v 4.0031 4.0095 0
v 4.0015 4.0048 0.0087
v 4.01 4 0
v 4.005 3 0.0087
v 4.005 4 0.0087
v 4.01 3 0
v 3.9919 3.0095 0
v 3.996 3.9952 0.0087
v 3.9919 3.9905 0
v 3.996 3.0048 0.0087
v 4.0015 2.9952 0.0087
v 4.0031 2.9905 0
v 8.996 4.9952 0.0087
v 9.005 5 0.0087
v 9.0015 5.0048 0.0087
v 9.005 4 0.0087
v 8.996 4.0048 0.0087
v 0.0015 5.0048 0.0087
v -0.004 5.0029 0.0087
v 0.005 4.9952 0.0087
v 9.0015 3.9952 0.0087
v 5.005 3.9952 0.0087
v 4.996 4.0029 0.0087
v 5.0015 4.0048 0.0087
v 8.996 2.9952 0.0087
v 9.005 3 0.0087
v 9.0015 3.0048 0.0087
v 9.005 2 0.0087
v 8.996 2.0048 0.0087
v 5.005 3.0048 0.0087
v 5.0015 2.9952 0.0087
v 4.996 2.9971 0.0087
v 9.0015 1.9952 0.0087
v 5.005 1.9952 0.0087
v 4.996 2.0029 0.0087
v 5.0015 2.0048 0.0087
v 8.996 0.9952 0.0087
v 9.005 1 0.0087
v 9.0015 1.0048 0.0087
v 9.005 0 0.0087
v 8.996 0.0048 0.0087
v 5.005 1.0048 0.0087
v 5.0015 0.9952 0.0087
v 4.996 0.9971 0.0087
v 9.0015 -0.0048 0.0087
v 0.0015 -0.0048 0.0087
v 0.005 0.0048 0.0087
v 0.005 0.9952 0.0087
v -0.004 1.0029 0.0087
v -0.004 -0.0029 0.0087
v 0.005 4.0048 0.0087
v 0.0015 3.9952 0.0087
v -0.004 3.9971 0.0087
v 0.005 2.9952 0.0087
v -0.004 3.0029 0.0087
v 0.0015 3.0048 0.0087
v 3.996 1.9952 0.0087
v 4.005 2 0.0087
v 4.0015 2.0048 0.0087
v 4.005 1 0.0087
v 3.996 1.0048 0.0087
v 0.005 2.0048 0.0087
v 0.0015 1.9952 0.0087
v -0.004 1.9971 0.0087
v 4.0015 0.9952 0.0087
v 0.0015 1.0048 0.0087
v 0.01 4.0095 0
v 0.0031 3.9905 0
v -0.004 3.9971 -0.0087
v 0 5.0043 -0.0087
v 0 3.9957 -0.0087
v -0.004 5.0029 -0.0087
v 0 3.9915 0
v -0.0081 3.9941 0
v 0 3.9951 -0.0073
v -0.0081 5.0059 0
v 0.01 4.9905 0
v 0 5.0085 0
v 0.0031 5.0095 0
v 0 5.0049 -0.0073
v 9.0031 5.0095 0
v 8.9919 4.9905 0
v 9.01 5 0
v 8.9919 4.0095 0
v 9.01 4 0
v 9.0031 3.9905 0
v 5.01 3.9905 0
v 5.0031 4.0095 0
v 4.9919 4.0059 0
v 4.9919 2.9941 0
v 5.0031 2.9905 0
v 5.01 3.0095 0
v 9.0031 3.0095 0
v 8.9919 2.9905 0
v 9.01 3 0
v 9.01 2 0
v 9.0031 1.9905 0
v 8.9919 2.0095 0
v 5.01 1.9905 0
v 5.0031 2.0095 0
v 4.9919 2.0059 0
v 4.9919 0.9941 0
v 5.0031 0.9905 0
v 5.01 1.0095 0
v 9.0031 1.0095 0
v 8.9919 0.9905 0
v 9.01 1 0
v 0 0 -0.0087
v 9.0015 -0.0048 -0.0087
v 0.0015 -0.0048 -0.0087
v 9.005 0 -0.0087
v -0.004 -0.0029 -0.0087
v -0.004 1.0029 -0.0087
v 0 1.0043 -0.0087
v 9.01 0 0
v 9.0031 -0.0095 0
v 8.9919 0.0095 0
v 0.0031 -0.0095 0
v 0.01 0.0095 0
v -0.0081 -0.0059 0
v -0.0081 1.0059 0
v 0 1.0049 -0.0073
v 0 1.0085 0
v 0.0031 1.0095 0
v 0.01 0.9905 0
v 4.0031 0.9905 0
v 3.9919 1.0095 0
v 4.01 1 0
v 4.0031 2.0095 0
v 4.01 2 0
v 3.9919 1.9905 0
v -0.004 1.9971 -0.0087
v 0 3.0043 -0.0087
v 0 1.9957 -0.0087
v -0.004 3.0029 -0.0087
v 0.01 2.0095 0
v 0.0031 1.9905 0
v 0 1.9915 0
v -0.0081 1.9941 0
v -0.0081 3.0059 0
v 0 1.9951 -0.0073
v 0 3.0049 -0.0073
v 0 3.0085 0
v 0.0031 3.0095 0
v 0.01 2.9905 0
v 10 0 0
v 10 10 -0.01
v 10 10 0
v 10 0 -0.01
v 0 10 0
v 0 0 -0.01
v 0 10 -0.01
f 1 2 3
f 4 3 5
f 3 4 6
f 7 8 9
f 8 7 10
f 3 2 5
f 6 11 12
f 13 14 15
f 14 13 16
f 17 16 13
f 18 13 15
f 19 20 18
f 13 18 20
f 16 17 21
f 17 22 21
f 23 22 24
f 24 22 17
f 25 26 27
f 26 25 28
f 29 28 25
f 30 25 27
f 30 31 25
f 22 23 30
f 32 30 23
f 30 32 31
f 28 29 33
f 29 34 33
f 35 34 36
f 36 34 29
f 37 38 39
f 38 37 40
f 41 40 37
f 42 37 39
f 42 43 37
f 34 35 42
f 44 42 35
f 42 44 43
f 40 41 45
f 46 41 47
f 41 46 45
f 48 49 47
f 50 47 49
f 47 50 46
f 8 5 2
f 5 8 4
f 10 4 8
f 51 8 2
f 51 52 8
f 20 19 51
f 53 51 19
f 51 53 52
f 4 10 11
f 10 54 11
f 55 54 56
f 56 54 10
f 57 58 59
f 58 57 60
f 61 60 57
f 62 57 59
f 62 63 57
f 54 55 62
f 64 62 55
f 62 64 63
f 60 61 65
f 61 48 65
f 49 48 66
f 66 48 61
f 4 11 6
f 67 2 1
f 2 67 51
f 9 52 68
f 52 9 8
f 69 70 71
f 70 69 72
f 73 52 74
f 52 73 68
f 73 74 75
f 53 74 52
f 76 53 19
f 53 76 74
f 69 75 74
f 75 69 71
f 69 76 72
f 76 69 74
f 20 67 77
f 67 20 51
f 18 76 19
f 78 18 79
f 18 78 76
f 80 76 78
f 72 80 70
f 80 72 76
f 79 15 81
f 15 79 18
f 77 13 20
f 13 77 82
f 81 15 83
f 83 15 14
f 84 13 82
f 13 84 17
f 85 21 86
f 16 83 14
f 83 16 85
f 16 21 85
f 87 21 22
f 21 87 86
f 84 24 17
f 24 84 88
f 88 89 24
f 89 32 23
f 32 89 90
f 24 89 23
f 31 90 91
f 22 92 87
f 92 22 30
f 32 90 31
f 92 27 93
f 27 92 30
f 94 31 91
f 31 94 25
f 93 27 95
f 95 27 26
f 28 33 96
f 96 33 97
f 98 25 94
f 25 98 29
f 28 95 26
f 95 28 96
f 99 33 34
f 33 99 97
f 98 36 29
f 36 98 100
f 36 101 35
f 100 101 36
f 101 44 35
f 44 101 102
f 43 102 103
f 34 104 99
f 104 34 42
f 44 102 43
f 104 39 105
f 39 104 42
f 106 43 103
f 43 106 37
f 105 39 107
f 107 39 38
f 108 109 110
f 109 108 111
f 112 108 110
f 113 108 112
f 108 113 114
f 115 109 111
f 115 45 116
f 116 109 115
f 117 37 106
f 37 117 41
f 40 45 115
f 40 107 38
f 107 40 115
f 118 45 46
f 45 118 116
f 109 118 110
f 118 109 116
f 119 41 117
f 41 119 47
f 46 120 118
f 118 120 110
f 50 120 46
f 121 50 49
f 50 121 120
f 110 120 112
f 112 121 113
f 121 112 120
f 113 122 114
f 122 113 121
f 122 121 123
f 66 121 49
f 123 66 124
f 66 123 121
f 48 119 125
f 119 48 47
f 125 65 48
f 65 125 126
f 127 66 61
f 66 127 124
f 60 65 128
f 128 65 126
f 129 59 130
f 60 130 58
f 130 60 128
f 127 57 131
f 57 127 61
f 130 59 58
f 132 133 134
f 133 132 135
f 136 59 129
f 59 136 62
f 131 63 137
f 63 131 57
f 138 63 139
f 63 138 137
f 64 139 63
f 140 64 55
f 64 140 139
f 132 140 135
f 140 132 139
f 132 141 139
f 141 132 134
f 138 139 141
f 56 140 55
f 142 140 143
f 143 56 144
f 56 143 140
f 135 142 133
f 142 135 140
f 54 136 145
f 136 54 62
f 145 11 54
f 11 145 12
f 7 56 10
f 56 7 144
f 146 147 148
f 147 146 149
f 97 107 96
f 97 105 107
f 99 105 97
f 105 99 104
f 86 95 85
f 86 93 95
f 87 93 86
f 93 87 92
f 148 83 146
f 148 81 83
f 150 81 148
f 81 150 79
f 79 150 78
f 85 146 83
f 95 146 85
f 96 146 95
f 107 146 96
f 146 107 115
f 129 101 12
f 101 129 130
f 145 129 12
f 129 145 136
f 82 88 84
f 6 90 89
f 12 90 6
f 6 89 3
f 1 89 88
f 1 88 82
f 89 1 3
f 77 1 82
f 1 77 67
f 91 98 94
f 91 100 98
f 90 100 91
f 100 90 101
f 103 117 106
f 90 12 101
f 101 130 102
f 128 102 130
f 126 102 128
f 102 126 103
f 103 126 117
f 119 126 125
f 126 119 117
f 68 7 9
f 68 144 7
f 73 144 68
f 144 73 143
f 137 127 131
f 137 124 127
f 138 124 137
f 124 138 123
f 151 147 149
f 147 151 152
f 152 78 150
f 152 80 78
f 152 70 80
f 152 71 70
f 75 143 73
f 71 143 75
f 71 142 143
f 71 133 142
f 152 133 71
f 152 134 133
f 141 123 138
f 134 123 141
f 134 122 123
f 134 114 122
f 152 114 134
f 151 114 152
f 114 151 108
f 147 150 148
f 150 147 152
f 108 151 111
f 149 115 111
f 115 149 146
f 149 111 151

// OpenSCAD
hull(){
    translate([4, 3]) sphere(0.01);
    translate([4, 4]) sphere(0.01);
}
hull(){
    translate([4, 4]) sphere(0.01);
    translate([3, 4]) sphere(0.01);
}
hull(){
    translate([3, 4]) sphere(0.01);
    translate([2, 4]) sphere(0.01);
}
hull(){
    translate([2, 4]) sphere(0.01);
    translate([1, 4]) sphere(0.01);
}
hull(){
    translate([1, 4]) sphere(0.01);
    translate([0, 4]) sphere(0.01);
}
hull(){
    translate([0, 4]) sphere(0.01);
    translate([0, 5]) sphere(0.01);
}
hull(){
    translate([0, 5]) sphere(0.01);
    translate([1, 5]) sphere(0.01);
}
hull(){
    translate([1, 5]) sphere(0.01);
    translate([2, 5]) sphere(0.01);
}
hull(){
    translate([2, 5]) sphere(0.01);
    translate([3, 5]) sphere(0.01);
}
hull(){
    translate([3, 5]) sphere(0.01);
    translate([4, 5]) sphere(0.01);
}
hull(){
    translate([4, 5]) sphere(0.01);
    translate([5, 5]) sphere(0.01);
}
hull(){
    translate([5, 5]) sphere(0.01);
    translate([6, 5]) sphere(0.01);
}
hull(){
    translate([6, 5]) sphere(0.01);
    translate([7, 5]) sphere(0.01);
}
hull(){
    translate([7, 5]) sphere(0.01);
    translate([8, 5]) sphere(0.01);
}
hull(){
    translate([8, 5]) sphere(0.01);
    translate([9, 5]) sphere(0.01);
}
hull(){
    translate([9, 5]) sphere(0.01);
    translate([9, 4]) sphere(0.01);
}
hull(){
    translate([9, 4]) sphere(0.01);
    translate([8, 4]) sphere(0.01);
}
hull(){
    translate([8, 4]) sphere(0.01);
    translate([7, 4]) sphere(0.01);
}
hull(){
    translate([7, 4]) sphere(0.01);
    translate([6, 4]) sphere(0.01);
}
hull(){
    translate([6, 4]) sphere(0.01);
    translate([5, 4]) sphere(0.01);
}
hull(){
    translate([5, 4]) sphere(0.01);
    translate([5, 3]) sphere(0.01);
}
hull(){
    translate([5, 3]) sphere(0.01);
    translate([6, 3]) sphere(0.01);
}
hull(){
    translate([6, 3]) sphere(0.01);
    translate([7, 3]) sphere(0.01);
}
hull(){
    translate([7, 3]) sphere(0.01);
    translate([8, 3]) sphere(0.01);
}
hull(){
    translate([8, 3]) sphere(0.01);
    translate([9, 3]) sphere(0.01);
}
hull(){
    translate([9, 3]) sphere(0.01);
    translate([9, 2]) sphere(0.01);
}
hull(){
    translate([9, 2]) sphere(0.01);
    translate([8, 2]) sphere(0.01);
}
hull(){
    translate([8, 2]) sphere(0.01);
    translate([7, 2]) sphere(0.01);
}
hull(){
    translate([7, 2]) sphere(0.01);
    translate([6, 2]) sphere(0.01);
}
hull(){
    translate([6, 2]) sphere(0.01);
    translate([5, 2]) sphere(0.01);
}
hull(){
    translate([5, 2]) sphere(0.01);
    translate([5, 1]) sphere(0.01);
}
hull(){
    translate([5, 1]) sphere(0.01);
    translate([6, 1]) sphere(0.01);
}
hull(){
    translate([6, 1]) sphere(0.01);
    translate([7, 1]) sphere(0.01);
}
hull(){
    translate([7, 1]) sphere(0.01);
    translate([8, 1]) sphere(0.01);
}
hull(){
    translate([8, 1]) sphere(0.01);
    translate([9, 1]) sphere(0.01);
}
hull(){
    translate([9, 1]) sphere(0.01);
    translate([9, 0]) sphere(0.01);
}
hull(){
    translate([9, 0]) sphere(0.01);
    translate([8, 0]) sphere(0.01);
}
hull(){
    translate([8, 0]) sphere(0.01);
    translate([7, 0]) sphere(0.01);
}
hull(){
    translate([7, 0]) sphere(0.01);
    translate([6, 0]) sphere(0.01);
}
hull(){
    translate([6, 0]) sphere(0.01);
    translate([5, 0]) sphere(0.01);
}
hull(){
    translate([5, 0]) sphere(0.01);
    translate([4, 0]) sphere(0.01);
}
hull(){
    translate([4, 0]) sphere(0.01);
    translate([3, 0]) sphere(0.01);
}
hull(){
    translate([3, 0]) sphere(0.01);
    translate([2, 0]) sphere(0.01);
}
hull(){
    translate([2, 0]) sphere(0.01);
    translate([1, 0]) sphere(0.01);
}
hull(){
    translate([1, 0]) sphere(0.01);
    translate([0, 0]) sphere(0.01);
}
hull(){
    translate([0, 0]) sphere(0.01);
    translate([0, 1]) sphere(0.01);
}
hull(){
    translate([0, 1]) sphere(0.01);
    translate([1, 1]) sphere(0.01);
}
hull(){
    translate([1, 1]) sphere(0.01);
    translate([2, 1]) sphere(0.01);
}
hull(){
    translate([2, 1]) sphere(0.01);
    translate([3, 1]) sphere(0.01);
}
hull(){
    translate([3, 1]) sphere(0.01);
    translate([4, 1]) sphere(0.01);
}
hull(){
    translate([4, 1]) sphere(0.01);
    translate([4, 2]) sphere(0.01);
}
hull(){
    translate([4, 2]) sphere(0.01);
    translate([3, 2]) sphere(0.01);
}
hull(){
    translate([3, 2]) sphere(0.01);
    translate([2, 2]) sphere(0.01);
}
hull(){
    translate([2, 2]) sphere(0.01);
    translate([1, 2]) sphere(0.01);
}
hull(){
    translate([1, 2]) sphere(0.01);
    translate([0, 2]) sphere(0.01);
}
hull(){
    translate([0, 2]) sphere(0.01);
    translate([0, 3]) sphere(0.01);
}
hull(){
    translate([0, 3]) sphere(0.01);
    translate([1, 3]) sphere(0.01);
}
hull(){
    translate([1, 3]) sphere(0.01);
    translate([2, 3]) sphere(0.01);
}
hull(){
    translate([2, 3]) sphere(0.01);
    translate([3, 3]) sphere(0.01);
}
hull(){
    translate([3, 3]) sphere(0.01);
    translate([4, 3]) sphere(0.01);
}
translate([0,0,-0.01]) color([0.1,0.1,0.1]) cube([10,10,0.01]);
